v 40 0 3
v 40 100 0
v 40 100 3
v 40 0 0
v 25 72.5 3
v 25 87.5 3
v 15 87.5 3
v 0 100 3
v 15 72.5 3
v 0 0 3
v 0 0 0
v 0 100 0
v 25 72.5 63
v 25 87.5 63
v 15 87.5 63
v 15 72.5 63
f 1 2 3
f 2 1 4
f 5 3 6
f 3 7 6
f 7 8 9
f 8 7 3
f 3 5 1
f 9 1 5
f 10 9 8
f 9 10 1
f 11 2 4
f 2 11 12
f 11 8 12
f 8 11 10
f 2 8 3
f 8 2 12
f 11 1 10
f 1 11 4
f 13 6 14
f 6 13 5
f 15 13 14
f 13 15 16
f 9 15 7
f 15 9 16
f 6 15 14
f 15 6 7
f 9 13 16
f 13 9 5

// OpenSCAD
$fn = 100 * 1;

//  Length of the base plate
length = 100;

//  Width of the base plate
width = 40;

//  Thickness of the base plate
thickness = 3;

//  Displacement of the CENTER of the beam in x direction
dx = 20;

//  Displacement of the CENTER of the beam in y direction
dy = 80;

//  Thickness of the beam in x direction
beamWidth = 10;

//  Thickness of the beam in y direction
beamLength = 15;

//  Height of the beam
beamHeight = 60;

mount();

module mount()
{
    union()
    {
        cube([width, length, thickness]);
        translate([dx - beamWidth / 2, dy - beamLength / 2, thickness])
        {
            cube([beamWidth, beamLength, beamHeight]);
        }
    }
}
